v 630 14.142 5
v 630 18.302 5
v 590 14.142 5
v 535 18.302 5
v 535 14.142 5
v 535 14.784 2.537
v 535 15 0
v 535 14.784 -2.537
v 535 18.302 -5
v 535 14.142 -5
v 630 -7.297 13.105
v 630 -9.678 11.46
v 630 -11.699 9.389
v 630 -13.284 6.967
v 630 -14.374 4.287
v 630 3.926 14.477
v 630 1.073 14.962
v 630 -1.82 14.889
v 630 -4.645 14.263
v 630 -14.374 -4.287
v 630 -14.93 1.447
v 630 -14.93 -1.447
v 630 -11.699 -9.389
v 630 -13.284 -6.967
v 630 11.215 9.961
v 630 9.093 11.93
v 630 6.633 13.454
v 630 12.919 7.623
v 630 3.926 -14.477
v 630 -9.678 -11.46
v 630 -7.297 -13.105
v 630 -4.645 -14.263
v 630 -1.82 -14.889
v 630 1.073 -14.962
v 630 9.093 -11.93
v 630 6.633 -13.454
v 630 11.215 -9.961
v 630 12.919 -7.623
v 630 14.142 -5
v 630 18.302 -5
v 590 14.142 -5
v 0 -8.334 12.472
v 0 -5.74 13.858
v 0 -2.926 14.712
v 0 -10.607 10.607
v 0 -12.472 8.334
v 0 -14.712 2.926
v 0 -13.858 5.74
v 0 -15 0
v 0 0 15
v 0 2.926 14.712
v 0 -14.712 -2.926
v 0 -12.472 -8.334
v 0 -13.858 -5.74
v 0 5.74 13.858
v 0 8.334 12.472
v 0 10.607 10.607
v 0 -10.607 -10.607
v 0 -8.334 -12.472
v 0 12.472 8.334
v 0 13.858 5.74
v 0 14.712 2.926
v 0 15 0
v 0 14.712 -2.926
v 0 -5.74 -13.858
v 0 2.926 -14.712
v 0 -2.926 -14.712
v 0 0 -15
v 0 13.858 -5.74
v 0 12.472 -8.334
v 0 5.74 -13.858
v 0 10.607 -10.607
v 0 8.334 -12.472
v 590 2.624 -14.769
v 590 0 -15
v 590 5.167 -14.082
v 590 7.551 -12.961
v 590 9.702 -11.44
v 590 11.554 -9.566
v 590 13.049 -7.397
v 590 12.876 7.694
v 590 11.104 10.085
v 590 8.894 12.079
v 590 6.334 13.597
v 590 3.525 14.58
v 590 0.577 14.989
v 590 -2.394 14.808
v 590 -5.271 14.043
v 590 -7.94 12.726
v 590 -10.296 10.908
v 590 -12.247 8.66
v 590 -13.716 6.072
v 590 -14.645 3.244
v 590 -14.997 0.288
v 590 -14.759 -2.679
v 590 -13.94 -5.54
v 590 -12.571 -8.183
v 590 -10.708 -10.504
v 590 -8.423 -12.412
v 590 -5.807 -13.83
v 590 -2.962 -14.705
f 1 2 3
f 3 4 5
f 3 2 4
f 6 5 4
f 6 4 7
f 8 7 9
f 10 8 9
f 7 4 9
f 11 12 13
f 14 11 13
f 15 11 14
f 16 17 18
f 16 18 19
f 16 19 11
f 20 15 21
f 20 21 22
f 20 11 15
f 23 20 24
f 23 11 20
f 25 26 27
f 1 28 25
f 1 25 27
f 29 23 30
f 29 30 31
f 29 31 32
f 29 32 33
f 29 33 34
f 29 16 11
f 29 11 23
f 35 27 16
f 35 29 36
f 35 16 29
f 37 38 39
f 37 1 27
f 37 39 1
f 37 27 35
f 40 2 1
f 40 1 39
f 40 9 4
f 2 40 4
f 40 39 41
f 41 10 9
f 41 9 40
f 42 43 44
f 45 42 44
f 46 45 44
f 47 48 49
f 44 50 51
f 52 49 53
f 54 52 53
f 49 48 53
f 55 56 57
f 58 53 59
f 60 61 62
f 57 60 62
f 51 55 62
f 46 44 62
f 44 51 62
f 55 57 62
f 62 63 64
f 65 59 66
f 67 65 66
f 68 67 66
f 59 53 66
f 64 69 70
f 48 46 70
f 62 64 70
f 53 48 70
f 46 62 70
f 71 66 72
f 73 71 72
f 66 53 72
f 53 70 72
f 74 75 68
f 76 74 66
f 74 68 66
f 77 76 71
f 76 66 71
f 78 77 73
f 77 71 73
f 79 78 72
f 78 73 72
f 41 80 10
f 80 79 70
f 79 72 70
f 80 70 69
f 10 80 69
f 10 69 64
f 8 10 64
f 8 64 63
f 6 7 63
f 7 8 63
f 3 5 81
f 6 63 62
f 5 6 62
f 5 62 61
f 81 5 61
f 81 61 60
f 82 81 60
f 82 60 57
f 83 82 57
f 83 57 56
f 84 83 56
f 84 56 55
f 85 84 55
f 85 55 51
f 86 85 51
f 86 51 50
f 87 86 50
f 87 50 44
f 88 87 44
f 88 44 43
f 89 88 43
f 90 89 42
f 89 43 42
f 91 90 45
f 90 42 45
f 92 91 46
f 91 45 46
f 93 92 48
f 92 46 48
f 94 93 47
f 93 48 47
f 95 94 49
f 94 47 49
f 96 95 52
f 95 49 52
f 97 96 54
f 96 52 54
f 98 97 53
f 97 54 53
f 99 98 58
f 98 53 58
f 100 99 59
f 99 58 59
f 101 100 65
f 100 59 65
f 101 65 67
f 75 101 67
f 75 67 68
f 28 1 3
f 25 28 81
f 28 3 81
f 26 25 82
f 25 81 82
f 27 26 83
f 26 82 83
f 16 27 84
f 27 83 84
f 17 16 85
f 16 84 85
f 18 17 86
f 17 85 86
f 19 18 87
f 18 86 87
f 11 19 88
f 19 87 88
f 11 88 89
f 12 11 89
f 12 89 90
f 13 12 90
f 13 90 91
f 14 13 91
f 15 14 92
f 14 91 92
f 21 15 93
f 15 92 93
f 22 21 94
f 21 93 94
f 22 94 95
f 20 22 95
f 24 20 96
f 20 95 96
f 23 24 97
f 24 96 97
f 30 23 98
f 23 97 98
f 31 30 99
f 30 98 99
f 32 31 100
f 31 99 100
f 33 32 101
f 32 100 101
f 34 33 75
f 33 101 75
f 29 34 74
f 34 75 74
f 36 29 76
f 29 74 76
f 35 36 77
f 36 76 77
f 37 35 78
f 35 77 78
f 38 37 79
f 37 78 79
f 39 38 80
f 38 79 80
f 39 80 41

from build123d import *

# Parameters (mm, degrees)
SKETCH1_R           = 15
BOSS_EXTRUDE1_DEPTH = 590
BOSS_EXTRUDE3_START = -55
BOSS_EXTRUDE3_DEPTH = 55
BOSS_EXTRUDE4_DEPTH = 40


with BuildPart() as part:
    # Sketch1 → Boss-Extrude1 (new body)
    with BuildSketch(Plane(origin=(0, 0, 0), x_dir=(0, 0, -1), z_dir=(1, 0, 0))):
        Circle(SKETCH1_R)
    extrude(amount=BOSS_EXTRUDE1_DEPTH)

    # Sketch2 → Boss-Extrude3 (add)
    with BuildSketch(Plane(origin=(590, 0, 0), x_dir=(0, 0, -1), z_dir=(1, 0, 0)).offset(BOSS_EXTRUDE3_START)):
        with BuildLine():
            Line((5, 14.142135624), (5, 18.302135624))
            Line((5, 18.302135624), (-5, 18.302135624))
            Line((-5, 18.302135624), (-5, 14.142135624))
            ThreePointArc((-5, 14.142135624), (0, 15), (5, 14.142135624))
        make_face()
    extrude(amount=BOSS_EXTRUDE3_DEPTH)

    # Sketch3 → Boss-Extrude4 (add)
    with BuildSketch(Plane(origin=(590, 0, 0), x_dir=(0, 0, -1), z_dir=(1, 0, 0))):
        with BuildLine():
            Line((-5, 18.302135624), (-5, 14.142135624))
            ThreePointArc((-5, 14.142135624), (0, -15), (5, 14.142135624))
            Line((5, 14.142135624), (5, 18.302135624))
            Line((5, 18.302135624), (-5, 18.302135624))
        make_face()
    extrude(amount=BOSS_EXTRUDE4_DEPTH)


solid = part.part
